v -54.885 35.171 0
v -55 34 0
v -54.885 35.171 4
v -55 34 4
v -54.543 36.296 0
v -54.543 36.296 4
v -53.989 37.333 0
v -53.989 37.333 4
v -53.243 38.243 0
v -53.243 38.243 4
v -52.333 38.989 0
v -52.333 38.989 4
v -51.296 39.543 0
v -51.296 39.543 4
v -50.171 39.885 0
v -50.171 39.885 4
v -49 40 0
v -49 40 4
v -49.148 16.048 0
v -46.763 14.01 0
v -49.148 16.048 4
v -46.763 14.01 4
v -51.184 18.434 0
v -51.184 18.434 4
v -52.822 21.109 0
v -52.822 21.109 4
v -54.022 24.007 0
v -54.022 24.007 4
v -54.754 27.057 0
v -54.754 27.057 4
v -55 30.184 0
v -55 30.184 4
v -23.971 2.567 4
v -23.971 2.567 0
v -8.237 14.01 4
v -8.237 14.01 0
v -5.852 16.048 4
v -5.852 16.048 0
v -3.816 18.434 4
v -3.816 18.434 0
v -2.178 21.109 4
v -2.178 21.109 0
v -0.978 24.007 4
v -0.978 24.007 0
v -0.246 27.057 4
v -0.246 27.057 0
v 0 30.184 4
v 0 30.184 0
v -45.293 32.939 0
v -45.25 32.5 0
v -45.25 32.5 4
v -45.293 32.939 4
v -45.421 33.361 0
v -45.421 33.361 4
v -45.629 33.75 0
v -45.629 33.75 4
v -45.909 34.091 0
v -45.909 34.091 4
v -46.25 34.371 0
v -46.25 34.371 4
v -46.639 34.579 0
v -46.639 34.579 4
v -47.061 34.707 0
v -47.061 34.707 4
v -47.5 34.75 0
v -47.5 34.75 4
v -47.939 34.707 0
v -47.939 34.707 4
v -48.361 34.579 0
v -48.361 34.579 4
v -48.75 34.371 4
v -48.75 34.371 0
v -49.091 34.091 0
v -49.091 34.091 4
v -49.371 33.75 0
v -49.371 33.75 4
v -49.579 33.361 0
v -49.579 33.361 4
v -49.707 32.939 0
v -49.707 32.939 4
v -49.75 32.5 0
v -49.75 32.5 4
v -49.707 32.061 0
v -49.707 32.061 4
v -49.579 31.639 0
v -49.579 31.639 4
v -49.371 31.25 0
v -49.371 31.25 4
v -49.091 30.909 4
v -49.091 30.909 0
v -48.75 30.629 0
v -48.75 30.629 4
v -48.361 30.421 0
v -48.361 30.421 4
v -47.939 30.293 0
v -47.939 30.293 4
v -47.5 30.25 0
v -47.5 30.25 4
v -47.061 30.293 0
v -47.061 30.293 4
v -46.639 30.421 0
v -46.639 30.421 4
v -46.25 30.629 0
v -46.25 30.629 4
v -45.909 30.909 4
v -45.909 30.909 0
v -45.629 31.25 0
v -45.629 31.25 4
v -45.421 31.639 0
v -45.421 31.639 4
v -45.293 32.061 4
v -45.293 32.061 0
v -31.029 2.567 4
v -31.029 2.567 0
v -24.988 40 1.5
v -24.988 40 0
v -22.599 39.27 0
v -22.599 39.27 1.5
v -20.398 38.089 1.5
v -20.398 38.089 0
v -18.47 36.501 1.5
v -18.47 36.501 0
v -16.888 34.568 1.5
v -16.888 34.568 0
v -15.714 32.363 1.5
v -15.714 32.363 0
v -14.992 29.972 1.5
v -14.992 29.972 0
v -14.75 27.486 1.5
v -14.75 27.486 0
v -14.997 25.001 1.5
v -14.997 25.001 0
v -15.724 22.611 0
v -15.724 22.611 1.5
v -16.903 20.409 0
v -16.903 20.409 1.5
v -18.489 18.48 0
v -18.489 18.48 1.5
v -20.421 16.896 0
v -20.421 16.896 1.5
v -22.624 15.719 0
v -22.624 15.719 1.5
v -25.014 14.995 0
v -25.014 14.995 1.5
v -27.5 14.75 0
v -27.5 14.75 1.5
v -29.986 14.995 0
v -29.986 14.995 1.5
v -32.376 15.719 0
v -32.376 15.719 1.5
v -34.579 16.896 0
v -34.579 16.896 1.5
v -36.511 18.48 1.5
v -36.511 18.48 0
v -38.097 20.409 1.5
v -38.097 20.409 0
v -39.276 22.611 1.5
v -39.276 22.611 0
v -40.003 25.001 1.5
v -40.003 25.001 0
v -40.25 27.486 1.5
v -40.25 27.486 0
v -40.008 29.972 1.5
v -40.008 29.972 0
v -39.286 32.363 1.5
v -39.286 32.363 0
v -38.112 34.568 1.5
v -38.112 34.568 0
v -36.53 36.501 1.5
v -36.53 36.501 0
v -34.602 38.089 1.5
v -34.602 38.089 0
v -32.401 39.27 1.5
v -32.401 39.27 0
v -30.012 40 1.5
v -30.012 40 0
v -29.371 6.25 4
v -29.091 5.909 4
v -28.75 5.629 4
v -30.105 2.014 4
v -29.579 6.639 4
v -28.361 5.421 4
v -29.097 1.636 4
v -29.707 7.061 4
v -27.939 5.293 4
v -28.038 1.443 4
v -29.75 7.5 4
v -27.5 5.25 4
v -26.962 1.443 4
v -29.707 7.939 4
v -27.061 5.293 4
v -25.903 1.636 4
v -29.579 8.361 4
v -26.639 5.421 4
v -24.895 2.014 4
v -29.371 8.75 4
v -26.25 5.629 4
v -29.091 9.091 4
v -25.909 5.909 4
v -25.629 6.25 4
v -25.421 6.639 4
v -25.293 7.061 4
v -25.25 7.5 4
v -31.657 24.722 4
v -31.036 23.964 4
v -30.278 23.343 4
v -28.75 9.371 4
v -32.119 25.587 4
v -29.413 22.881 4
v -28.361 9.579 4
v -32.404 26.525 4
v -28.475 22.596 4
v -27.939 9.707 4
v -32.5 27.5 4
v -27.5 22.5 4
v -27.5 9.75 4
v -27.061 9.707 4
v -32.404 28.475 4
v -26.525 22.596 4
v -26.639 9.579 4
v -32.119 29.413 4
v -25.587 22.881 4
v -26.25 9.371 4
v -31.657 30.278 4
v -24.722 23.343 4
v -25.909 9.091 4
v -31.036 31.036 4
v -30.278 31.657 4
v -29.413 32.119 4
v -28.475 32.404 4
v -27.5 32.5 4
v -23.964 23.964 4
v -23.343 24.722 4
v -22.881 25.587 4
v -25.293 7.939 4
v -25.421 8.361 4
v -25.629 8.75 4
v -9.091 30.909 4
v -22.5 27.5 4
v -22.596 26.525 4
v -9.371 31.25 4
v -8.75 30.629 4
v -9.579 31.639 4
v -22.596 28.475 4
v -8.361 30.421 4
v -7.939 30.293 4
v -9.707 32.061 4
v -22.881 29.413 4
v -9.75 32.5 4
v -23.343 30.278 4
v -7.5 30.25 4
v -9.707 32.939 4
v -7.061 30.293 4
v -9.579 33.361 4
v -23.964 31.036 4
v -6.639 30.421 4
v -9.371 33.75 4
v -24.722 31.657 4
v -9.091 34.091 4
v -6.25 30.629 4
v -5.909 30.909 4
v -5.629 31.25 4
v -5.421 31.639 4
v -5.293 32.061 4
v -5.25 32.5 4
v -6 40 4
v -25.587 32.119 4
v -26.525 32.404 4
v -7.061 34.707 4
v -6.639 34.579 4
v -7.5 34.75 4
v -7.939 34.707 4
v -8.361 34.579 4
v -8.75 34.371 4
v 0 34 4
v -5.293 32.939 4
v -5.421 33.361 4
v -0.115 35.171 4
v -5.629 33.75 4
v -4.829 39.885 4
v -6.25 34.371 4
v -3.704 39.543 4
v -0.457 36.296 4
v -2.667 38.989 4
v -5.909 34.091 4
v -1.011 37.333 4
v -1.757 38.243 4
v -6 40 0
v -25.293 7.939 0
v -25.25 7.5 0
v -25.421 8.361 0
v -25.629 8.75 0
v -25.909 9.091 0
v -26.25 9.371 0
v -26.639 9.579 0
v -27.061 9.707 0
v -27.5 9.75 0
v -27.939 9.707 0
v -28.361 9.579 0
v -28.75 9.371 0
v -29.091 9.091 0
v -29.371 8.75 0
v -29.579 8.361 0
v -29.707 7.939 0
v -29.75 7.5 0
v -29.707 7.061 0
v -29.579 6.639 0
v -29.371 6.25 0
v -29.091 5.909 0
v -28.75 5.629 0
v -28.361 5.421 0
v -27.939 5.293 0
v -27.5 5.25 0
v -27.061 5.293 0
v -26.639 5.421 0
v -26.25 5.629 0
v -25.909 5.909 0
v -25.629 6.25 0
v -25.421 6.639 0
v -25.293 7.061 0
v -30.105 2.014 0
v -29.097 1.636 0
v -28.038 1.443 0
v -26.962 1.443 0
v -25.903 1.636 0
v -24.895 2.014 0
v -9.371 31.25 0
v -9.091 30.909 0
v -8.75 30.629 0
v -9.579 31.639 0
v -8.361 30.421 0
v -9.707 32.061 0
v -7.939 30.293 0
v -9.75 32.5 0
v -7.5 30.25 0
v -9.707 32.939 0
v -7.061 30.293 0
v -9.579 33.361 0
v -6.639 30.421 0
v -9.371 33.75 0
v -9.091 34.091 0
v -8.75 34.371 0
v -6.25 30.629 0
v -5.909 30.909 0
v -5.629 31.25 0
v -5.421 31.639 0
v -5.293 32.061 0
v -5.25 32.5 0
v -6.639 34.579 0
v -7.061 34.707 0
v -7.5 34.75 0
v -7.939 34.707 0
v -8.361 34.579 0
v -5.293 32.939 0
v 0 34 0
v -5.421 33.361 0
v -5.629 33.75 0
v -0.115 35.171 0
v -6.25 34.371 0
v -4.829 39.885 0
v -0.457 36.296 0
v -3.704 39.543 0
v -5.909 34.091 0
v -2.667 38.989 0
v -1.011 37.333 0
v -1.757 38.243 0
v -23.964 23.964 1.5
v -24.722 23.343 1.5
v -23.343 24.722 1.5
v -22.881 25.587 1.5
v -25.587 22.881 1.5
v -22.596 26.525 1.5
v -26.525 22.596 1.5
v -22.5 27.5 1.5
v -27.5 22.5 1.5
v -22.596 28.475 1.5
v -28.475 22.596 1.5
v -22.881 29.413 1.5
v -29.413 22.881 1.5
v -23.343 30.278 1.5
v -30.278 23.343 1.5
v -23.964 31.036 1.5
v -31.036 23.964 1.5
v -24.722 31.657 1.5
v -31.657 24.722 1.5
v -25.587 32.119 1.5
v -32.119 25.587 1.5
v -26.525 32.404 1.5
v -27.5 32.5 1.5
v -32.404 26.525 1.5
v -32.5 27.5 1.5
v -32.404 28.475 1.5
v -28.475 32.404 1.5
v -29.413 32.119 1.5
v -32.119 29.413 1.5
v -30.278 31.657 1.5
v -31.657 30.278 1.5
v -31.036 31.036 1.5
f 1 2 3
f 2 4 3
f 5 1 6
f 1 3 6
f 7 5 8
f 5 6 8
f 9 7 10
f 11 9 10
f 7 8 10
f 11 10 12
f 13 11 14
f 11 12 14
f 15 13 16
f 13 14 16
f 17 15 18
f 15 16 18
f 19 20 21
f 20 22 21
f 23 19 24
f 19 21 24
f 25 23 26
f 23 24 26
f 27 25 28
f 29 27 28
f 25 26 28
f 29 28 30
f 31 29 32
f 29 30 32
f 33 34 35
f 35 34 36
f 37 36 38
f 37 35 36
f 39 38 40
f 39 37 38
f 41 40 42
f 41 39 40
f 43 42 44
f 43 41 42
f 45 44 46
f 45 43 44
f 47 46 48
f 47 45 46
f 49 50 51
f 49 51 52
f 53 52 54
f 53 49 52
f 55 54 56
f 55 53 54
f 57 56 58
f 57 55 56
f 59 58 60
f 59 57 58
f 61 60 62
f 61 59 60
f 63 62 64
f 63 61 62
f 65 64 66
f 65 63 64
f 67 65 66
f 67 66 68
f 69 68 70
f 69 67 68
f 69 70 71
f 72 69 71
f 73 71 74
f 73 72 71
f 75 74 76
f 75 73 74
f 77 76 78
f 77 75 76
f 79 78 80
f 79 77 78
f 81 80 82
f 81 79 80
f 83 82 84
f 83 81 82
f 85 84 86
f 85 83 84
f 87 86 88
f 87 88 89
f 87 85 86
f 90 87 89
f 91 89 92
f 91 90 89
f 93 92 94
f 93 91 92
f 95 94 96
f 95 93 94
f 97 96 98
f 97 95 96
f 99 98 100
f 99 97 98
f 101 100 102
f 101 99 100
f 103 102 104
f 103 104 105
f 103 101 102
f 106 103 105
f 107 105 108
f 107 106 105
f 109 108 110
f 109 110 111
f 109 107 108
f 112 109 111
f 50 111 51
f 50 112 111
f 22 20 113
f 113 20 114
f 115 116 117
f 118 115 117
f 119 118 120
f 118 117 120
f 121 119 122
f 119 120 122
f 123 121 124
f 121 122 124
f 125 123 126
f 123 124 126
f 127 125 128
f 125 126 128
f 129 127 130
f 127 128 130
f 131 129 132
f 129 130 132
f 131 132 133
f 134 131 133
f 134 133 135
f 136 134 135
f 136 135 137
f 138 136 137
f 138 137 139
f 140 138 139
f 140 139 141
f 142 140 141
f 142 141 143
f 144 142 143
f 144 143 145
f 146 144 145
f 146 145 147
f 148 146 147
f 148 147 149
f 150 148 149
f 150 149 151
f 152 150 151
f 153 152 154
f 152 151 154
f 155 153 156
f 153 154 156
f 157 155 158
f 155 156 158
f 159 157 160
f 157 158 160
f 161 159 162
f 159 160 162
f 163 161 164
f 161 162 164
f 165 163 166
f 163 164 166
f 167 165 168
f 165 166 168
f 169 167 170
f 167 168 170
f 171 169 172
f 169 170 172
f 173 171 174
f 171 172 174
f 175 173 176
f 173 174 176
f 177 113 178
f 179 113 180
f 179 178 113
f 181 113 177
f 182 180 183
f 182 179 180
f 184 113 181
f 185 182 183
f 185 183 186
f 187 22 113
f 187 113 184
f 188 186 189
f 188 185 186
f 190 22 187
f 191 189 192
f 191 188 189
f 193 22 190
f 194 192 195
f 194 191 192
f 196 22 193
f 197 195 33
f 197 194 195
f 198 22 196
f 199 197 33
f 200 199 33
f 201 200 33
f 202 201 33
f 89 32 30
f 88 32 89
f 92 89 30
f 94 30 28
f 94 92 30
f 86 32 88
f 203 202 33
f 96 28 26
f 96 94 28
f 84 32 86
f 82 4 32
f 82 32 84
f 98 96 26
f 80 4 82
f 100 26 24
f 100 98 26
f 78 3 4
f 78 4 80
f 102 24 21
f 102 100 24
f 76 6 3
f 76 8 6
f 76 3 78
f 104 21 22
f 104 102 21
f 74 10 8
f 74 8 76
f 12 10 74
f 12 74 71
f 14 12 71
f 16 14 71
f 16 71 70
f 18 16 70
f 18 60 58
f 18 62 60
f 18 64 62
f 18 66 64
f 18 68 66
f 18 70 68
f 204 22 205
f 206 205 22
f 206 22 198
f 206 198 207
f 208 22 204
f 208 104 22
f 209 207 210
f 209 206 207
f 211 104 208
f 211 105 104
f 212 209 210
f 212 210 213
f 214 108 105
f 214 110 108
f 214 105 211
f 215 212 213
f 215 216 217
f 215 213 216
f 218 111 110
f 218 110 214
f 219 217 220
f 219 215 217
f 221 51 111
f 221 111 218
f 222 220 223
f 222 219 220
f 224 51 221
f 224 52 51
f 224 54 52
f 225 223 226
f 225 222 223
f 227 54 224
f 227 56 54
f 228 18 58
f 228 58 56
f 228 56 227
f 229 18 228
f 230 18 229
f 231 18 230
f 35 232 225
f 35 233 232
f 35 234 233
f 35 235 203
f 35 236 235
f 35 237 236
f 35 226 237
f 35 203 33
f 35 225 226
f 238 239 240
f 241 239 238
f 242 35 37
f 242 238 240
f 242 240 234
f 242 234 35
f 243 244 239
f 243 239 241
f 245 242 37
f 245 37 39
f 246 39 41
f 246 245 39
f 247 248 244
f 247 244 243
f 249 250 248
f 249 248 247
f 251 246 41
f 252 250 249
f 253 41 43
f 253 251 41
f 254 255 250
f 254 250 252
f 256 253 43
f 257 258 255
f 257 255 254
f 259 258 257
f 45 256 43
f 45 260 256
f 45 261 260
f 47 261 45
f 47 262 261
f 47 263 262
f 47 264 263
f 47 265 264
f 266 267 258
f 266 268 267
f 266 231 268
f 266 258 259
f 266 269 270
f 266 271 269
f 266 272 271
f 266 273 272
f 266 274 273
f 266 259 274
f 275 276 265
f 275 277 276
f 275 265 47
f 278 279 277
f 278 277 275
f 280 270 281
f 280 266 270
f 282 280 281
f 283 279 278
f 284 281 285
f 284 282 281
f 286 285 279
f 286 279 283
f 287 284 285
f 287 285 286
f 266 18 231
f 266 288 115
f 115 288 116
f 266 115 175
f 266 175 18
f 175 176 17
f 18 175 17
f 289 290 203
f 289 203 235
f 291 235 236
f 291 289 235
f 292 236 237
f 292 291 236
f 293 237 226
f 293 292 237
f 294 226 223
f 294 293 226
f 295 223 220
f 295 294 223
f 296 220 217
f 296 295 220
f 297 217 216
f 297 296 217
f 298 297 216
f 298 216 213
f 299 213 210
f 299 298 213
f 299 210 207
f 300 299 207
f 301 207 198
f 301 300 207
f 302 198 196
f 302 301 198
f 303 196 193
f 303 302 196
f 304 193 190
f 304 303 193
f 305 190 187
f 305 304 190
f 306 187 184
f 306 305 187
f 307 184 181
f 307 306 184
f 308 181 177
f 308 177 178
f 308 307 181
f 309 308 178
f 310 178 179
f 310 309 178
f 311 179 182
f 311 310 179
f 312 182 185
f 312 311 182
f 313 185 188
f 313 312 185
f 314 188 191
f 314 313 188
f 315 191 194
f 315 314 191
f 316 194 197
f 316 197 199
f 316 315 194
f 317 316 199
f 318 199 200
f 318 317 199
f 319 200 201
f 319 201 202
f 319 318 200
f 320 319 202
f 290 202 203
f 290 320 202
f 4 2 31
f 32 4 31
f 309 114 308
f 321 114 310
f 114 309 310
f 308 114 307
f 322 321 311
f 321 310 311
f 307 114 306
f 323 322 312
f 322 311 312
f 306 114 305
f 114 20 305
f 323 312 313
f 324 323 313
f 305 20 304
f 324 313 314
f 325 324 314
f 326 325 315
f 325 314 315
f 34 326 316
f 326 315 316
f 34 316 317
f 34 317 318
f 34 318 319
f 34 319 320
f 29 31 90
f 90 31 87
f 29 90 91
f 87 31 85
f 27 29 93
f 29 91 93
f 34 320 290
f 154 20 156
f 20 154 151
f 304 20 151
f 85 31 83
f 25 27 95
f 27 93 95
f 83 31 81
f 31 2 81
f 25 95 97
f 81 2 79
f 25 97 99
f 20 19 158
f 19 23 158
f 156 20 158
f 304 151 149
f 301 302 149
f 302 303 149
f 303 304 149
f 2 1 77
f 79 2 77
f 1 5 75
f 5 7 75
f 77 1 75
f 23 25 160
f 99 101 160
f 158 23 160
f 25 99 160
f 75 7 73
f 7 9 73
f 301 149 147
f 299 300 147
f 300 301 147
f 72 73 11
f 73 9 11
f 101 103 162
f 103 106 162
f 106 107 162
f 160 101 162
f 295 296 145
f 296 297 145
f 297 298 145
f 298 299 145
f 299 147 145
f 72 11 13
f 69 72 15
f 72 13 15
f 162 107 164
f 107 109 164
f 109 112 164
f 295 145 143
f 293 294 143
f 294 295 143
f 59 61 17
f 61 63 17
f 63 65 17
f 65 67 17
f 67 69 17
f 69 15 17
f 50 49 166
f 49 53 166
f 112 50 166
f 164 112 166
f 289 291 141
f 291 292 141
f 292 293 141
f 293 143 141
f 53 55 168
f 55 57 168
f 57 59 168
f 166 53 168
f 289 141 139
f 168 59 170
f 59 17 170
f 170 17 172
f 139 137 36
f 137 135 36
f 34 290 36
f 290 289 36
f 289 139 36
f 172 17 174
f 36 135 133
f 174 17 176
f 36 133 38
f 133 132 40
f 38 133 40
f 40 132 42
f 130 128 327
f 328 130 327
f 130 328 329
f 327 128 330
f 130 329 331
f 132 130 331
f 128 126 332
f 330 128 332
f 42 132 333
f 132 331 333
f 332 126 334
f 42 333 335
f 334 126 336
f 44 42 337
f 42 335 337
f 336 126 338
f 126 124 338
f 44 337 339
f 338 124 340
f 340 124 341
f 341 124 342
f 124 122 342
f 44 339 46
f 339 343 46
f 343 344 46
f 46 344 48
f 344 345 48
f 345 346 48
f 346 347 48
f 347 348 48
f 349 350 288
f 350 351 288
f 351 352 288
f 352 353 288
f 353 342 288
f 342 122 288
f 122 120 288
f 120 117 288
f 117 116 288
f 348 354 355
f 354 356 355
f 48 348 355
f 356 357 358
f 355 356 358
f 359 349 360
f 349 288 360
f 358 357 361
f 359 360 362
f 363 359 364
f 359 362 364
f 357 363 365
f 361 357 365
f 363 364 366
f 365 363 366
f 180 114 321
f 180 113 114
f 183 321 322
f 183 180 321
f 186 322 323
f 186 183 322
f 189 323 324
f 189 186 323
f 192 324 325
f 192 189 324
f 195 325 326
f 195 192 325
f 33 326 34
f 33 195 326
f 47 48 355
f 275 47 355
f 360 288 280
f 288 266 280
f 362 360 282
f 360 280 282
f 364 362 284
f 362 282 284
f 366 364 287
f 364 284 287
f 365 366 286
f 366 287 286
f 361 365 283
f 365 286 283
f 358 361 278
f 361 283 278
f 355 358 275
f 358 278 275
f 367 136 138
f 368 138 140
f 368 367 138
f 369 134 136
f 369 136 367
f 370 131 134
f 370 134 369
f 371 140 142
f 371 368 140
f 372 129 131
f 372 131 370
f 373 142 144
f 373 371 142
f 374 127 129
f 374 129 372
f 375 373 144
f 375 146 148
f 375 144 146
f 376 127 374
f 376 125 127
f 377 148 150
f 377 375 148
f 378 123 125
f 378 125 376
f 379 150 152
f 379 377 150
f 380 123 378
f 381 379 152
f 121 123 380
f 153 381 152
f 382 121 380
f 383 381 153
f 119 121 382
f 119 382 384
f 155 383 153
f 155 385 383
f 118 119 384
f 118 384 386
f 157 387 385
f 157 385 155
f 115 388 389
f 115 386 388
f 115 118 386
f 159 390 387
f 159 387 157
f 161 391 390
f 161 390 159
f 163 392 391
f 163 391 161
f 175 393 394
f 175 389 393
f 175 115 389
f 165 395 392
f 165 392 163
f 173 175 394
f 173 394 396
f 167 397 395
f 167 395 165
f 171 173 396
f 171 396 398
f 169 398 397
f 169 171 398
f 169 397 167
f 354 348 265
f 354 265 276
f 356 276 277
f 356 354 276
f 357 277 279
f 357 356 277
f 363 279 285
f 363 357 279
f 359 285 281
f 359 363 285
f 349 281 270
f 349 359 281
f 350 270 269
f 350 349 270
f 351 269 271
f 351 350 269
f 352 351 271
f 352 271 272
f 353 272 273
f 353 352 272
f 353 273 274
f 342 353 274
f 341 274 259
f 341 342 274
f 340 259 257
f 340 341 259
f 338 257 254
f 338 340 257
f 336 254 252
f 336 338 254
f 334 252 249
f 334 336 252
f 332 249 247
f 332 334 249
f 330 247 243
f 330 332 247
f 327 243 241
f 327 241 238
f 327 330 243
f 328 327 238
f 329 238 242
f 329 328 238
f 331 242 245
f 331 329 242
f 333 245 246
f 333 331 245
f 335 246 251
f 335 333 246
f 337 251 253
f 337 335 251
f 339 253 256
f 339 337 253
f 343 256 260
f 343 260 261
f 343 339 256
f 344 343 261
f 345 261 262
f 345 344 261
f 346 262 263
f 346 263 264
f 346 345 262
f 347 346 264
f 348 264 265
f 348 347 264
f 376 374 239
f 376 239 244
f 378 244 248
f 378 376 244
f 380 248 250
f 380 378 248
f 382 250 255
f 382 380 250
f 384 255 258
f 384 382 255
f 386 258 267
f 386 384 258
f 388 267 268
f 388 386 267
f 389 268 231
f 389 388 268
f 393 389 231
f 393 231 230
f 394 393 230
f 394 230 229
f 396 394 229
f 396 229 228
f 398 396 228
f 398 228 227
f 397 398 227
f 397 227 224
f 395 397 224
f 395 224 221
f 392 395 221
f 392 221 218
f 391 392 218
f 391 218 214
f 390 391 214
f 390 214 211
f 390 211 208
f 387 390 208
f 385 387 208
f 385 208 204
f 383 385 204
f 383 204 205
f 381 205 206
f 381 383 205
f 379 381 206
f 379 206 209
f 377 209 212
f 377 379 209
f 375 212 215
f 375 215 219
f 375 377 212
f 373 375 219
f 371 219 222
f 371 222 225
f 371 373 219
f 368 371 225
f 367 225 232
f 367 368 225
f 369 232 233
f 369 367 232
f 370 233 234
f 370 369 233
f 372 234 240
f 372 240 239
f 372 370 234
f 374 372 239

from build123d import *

# Parameters (mm, degrees)
ESQUISSE1_R              = 5
ESQUISSE1_R_2            = 2.25
BOSS_EXTRU_1_DEPTH       = 4
CONG_2_R                 = 6
CONG_3_R                 = 20
ESQUISSE4_R              = 12.75
ENL_V_MAT_EXTRU_20_DEPTH = 1.5


with BuildPart() as part:
    # Esquisse1 → Boss.-Extru.1 (new body)
    with BuildSketch(Plane.XY):
        Polygon((-55, 20), (-27.5, 0), (0, 20), (0, 40), (-55, 40), align=None)
        with Locations((-27.5, 27.5)):
            Circle(ESQUISSE1_R, mode=Mode.SUBTRACT)
        with Locations((-47.5, 32.5)):
            Circle(ESQUISSE1_R_2, mode=Mode.SUBTRACT)
        with Locations((-7.5, 32.5)):
            Circle(ESQUISSE1_R_2, mode=Mode.SUBTRACT)
        with Locations((-27.5, 7.5)):
            Circle(ESQUISSE1_R_2, mode=Mode.SUBTRACT)
    extrude(amount=BOSS_EXTRU_1_DEPTH)

    # Congé2
    cong_2_edges = [part.edges().sort_by_distance(p)[0] for p in [
        (-55, 40, 2),
        (0, 40, 2),
        (-27.5, 0, 2),
    ]]
    fillet(cong_2_edges, radius=CONG_2_R)

    # Congé3
    cong_3_edges = [part.edges().sort_by_distance(p)[0] for p in [
        (0, 20, 2),
        (-55, 20, 2),
    ]]
    fillet(cong_3_edges, radius=CONG_3_R)

    # Esquisse4 → Enlèv. mat.-Extru.20 (cut)
    with BuildSketch(Plane(origin=(0, 0, 0), x_dir=(-1, 0, 0), z_dir=(0, 0, -1))):
        with Locations((27.5, 27.5)):
            Circle(ESQUISSE4_R)
    extrude(amount=-ENL_V_MAT_EXTRU_20_DEPTH, mode=Mode.SUBTRACT)


solid = part.part
